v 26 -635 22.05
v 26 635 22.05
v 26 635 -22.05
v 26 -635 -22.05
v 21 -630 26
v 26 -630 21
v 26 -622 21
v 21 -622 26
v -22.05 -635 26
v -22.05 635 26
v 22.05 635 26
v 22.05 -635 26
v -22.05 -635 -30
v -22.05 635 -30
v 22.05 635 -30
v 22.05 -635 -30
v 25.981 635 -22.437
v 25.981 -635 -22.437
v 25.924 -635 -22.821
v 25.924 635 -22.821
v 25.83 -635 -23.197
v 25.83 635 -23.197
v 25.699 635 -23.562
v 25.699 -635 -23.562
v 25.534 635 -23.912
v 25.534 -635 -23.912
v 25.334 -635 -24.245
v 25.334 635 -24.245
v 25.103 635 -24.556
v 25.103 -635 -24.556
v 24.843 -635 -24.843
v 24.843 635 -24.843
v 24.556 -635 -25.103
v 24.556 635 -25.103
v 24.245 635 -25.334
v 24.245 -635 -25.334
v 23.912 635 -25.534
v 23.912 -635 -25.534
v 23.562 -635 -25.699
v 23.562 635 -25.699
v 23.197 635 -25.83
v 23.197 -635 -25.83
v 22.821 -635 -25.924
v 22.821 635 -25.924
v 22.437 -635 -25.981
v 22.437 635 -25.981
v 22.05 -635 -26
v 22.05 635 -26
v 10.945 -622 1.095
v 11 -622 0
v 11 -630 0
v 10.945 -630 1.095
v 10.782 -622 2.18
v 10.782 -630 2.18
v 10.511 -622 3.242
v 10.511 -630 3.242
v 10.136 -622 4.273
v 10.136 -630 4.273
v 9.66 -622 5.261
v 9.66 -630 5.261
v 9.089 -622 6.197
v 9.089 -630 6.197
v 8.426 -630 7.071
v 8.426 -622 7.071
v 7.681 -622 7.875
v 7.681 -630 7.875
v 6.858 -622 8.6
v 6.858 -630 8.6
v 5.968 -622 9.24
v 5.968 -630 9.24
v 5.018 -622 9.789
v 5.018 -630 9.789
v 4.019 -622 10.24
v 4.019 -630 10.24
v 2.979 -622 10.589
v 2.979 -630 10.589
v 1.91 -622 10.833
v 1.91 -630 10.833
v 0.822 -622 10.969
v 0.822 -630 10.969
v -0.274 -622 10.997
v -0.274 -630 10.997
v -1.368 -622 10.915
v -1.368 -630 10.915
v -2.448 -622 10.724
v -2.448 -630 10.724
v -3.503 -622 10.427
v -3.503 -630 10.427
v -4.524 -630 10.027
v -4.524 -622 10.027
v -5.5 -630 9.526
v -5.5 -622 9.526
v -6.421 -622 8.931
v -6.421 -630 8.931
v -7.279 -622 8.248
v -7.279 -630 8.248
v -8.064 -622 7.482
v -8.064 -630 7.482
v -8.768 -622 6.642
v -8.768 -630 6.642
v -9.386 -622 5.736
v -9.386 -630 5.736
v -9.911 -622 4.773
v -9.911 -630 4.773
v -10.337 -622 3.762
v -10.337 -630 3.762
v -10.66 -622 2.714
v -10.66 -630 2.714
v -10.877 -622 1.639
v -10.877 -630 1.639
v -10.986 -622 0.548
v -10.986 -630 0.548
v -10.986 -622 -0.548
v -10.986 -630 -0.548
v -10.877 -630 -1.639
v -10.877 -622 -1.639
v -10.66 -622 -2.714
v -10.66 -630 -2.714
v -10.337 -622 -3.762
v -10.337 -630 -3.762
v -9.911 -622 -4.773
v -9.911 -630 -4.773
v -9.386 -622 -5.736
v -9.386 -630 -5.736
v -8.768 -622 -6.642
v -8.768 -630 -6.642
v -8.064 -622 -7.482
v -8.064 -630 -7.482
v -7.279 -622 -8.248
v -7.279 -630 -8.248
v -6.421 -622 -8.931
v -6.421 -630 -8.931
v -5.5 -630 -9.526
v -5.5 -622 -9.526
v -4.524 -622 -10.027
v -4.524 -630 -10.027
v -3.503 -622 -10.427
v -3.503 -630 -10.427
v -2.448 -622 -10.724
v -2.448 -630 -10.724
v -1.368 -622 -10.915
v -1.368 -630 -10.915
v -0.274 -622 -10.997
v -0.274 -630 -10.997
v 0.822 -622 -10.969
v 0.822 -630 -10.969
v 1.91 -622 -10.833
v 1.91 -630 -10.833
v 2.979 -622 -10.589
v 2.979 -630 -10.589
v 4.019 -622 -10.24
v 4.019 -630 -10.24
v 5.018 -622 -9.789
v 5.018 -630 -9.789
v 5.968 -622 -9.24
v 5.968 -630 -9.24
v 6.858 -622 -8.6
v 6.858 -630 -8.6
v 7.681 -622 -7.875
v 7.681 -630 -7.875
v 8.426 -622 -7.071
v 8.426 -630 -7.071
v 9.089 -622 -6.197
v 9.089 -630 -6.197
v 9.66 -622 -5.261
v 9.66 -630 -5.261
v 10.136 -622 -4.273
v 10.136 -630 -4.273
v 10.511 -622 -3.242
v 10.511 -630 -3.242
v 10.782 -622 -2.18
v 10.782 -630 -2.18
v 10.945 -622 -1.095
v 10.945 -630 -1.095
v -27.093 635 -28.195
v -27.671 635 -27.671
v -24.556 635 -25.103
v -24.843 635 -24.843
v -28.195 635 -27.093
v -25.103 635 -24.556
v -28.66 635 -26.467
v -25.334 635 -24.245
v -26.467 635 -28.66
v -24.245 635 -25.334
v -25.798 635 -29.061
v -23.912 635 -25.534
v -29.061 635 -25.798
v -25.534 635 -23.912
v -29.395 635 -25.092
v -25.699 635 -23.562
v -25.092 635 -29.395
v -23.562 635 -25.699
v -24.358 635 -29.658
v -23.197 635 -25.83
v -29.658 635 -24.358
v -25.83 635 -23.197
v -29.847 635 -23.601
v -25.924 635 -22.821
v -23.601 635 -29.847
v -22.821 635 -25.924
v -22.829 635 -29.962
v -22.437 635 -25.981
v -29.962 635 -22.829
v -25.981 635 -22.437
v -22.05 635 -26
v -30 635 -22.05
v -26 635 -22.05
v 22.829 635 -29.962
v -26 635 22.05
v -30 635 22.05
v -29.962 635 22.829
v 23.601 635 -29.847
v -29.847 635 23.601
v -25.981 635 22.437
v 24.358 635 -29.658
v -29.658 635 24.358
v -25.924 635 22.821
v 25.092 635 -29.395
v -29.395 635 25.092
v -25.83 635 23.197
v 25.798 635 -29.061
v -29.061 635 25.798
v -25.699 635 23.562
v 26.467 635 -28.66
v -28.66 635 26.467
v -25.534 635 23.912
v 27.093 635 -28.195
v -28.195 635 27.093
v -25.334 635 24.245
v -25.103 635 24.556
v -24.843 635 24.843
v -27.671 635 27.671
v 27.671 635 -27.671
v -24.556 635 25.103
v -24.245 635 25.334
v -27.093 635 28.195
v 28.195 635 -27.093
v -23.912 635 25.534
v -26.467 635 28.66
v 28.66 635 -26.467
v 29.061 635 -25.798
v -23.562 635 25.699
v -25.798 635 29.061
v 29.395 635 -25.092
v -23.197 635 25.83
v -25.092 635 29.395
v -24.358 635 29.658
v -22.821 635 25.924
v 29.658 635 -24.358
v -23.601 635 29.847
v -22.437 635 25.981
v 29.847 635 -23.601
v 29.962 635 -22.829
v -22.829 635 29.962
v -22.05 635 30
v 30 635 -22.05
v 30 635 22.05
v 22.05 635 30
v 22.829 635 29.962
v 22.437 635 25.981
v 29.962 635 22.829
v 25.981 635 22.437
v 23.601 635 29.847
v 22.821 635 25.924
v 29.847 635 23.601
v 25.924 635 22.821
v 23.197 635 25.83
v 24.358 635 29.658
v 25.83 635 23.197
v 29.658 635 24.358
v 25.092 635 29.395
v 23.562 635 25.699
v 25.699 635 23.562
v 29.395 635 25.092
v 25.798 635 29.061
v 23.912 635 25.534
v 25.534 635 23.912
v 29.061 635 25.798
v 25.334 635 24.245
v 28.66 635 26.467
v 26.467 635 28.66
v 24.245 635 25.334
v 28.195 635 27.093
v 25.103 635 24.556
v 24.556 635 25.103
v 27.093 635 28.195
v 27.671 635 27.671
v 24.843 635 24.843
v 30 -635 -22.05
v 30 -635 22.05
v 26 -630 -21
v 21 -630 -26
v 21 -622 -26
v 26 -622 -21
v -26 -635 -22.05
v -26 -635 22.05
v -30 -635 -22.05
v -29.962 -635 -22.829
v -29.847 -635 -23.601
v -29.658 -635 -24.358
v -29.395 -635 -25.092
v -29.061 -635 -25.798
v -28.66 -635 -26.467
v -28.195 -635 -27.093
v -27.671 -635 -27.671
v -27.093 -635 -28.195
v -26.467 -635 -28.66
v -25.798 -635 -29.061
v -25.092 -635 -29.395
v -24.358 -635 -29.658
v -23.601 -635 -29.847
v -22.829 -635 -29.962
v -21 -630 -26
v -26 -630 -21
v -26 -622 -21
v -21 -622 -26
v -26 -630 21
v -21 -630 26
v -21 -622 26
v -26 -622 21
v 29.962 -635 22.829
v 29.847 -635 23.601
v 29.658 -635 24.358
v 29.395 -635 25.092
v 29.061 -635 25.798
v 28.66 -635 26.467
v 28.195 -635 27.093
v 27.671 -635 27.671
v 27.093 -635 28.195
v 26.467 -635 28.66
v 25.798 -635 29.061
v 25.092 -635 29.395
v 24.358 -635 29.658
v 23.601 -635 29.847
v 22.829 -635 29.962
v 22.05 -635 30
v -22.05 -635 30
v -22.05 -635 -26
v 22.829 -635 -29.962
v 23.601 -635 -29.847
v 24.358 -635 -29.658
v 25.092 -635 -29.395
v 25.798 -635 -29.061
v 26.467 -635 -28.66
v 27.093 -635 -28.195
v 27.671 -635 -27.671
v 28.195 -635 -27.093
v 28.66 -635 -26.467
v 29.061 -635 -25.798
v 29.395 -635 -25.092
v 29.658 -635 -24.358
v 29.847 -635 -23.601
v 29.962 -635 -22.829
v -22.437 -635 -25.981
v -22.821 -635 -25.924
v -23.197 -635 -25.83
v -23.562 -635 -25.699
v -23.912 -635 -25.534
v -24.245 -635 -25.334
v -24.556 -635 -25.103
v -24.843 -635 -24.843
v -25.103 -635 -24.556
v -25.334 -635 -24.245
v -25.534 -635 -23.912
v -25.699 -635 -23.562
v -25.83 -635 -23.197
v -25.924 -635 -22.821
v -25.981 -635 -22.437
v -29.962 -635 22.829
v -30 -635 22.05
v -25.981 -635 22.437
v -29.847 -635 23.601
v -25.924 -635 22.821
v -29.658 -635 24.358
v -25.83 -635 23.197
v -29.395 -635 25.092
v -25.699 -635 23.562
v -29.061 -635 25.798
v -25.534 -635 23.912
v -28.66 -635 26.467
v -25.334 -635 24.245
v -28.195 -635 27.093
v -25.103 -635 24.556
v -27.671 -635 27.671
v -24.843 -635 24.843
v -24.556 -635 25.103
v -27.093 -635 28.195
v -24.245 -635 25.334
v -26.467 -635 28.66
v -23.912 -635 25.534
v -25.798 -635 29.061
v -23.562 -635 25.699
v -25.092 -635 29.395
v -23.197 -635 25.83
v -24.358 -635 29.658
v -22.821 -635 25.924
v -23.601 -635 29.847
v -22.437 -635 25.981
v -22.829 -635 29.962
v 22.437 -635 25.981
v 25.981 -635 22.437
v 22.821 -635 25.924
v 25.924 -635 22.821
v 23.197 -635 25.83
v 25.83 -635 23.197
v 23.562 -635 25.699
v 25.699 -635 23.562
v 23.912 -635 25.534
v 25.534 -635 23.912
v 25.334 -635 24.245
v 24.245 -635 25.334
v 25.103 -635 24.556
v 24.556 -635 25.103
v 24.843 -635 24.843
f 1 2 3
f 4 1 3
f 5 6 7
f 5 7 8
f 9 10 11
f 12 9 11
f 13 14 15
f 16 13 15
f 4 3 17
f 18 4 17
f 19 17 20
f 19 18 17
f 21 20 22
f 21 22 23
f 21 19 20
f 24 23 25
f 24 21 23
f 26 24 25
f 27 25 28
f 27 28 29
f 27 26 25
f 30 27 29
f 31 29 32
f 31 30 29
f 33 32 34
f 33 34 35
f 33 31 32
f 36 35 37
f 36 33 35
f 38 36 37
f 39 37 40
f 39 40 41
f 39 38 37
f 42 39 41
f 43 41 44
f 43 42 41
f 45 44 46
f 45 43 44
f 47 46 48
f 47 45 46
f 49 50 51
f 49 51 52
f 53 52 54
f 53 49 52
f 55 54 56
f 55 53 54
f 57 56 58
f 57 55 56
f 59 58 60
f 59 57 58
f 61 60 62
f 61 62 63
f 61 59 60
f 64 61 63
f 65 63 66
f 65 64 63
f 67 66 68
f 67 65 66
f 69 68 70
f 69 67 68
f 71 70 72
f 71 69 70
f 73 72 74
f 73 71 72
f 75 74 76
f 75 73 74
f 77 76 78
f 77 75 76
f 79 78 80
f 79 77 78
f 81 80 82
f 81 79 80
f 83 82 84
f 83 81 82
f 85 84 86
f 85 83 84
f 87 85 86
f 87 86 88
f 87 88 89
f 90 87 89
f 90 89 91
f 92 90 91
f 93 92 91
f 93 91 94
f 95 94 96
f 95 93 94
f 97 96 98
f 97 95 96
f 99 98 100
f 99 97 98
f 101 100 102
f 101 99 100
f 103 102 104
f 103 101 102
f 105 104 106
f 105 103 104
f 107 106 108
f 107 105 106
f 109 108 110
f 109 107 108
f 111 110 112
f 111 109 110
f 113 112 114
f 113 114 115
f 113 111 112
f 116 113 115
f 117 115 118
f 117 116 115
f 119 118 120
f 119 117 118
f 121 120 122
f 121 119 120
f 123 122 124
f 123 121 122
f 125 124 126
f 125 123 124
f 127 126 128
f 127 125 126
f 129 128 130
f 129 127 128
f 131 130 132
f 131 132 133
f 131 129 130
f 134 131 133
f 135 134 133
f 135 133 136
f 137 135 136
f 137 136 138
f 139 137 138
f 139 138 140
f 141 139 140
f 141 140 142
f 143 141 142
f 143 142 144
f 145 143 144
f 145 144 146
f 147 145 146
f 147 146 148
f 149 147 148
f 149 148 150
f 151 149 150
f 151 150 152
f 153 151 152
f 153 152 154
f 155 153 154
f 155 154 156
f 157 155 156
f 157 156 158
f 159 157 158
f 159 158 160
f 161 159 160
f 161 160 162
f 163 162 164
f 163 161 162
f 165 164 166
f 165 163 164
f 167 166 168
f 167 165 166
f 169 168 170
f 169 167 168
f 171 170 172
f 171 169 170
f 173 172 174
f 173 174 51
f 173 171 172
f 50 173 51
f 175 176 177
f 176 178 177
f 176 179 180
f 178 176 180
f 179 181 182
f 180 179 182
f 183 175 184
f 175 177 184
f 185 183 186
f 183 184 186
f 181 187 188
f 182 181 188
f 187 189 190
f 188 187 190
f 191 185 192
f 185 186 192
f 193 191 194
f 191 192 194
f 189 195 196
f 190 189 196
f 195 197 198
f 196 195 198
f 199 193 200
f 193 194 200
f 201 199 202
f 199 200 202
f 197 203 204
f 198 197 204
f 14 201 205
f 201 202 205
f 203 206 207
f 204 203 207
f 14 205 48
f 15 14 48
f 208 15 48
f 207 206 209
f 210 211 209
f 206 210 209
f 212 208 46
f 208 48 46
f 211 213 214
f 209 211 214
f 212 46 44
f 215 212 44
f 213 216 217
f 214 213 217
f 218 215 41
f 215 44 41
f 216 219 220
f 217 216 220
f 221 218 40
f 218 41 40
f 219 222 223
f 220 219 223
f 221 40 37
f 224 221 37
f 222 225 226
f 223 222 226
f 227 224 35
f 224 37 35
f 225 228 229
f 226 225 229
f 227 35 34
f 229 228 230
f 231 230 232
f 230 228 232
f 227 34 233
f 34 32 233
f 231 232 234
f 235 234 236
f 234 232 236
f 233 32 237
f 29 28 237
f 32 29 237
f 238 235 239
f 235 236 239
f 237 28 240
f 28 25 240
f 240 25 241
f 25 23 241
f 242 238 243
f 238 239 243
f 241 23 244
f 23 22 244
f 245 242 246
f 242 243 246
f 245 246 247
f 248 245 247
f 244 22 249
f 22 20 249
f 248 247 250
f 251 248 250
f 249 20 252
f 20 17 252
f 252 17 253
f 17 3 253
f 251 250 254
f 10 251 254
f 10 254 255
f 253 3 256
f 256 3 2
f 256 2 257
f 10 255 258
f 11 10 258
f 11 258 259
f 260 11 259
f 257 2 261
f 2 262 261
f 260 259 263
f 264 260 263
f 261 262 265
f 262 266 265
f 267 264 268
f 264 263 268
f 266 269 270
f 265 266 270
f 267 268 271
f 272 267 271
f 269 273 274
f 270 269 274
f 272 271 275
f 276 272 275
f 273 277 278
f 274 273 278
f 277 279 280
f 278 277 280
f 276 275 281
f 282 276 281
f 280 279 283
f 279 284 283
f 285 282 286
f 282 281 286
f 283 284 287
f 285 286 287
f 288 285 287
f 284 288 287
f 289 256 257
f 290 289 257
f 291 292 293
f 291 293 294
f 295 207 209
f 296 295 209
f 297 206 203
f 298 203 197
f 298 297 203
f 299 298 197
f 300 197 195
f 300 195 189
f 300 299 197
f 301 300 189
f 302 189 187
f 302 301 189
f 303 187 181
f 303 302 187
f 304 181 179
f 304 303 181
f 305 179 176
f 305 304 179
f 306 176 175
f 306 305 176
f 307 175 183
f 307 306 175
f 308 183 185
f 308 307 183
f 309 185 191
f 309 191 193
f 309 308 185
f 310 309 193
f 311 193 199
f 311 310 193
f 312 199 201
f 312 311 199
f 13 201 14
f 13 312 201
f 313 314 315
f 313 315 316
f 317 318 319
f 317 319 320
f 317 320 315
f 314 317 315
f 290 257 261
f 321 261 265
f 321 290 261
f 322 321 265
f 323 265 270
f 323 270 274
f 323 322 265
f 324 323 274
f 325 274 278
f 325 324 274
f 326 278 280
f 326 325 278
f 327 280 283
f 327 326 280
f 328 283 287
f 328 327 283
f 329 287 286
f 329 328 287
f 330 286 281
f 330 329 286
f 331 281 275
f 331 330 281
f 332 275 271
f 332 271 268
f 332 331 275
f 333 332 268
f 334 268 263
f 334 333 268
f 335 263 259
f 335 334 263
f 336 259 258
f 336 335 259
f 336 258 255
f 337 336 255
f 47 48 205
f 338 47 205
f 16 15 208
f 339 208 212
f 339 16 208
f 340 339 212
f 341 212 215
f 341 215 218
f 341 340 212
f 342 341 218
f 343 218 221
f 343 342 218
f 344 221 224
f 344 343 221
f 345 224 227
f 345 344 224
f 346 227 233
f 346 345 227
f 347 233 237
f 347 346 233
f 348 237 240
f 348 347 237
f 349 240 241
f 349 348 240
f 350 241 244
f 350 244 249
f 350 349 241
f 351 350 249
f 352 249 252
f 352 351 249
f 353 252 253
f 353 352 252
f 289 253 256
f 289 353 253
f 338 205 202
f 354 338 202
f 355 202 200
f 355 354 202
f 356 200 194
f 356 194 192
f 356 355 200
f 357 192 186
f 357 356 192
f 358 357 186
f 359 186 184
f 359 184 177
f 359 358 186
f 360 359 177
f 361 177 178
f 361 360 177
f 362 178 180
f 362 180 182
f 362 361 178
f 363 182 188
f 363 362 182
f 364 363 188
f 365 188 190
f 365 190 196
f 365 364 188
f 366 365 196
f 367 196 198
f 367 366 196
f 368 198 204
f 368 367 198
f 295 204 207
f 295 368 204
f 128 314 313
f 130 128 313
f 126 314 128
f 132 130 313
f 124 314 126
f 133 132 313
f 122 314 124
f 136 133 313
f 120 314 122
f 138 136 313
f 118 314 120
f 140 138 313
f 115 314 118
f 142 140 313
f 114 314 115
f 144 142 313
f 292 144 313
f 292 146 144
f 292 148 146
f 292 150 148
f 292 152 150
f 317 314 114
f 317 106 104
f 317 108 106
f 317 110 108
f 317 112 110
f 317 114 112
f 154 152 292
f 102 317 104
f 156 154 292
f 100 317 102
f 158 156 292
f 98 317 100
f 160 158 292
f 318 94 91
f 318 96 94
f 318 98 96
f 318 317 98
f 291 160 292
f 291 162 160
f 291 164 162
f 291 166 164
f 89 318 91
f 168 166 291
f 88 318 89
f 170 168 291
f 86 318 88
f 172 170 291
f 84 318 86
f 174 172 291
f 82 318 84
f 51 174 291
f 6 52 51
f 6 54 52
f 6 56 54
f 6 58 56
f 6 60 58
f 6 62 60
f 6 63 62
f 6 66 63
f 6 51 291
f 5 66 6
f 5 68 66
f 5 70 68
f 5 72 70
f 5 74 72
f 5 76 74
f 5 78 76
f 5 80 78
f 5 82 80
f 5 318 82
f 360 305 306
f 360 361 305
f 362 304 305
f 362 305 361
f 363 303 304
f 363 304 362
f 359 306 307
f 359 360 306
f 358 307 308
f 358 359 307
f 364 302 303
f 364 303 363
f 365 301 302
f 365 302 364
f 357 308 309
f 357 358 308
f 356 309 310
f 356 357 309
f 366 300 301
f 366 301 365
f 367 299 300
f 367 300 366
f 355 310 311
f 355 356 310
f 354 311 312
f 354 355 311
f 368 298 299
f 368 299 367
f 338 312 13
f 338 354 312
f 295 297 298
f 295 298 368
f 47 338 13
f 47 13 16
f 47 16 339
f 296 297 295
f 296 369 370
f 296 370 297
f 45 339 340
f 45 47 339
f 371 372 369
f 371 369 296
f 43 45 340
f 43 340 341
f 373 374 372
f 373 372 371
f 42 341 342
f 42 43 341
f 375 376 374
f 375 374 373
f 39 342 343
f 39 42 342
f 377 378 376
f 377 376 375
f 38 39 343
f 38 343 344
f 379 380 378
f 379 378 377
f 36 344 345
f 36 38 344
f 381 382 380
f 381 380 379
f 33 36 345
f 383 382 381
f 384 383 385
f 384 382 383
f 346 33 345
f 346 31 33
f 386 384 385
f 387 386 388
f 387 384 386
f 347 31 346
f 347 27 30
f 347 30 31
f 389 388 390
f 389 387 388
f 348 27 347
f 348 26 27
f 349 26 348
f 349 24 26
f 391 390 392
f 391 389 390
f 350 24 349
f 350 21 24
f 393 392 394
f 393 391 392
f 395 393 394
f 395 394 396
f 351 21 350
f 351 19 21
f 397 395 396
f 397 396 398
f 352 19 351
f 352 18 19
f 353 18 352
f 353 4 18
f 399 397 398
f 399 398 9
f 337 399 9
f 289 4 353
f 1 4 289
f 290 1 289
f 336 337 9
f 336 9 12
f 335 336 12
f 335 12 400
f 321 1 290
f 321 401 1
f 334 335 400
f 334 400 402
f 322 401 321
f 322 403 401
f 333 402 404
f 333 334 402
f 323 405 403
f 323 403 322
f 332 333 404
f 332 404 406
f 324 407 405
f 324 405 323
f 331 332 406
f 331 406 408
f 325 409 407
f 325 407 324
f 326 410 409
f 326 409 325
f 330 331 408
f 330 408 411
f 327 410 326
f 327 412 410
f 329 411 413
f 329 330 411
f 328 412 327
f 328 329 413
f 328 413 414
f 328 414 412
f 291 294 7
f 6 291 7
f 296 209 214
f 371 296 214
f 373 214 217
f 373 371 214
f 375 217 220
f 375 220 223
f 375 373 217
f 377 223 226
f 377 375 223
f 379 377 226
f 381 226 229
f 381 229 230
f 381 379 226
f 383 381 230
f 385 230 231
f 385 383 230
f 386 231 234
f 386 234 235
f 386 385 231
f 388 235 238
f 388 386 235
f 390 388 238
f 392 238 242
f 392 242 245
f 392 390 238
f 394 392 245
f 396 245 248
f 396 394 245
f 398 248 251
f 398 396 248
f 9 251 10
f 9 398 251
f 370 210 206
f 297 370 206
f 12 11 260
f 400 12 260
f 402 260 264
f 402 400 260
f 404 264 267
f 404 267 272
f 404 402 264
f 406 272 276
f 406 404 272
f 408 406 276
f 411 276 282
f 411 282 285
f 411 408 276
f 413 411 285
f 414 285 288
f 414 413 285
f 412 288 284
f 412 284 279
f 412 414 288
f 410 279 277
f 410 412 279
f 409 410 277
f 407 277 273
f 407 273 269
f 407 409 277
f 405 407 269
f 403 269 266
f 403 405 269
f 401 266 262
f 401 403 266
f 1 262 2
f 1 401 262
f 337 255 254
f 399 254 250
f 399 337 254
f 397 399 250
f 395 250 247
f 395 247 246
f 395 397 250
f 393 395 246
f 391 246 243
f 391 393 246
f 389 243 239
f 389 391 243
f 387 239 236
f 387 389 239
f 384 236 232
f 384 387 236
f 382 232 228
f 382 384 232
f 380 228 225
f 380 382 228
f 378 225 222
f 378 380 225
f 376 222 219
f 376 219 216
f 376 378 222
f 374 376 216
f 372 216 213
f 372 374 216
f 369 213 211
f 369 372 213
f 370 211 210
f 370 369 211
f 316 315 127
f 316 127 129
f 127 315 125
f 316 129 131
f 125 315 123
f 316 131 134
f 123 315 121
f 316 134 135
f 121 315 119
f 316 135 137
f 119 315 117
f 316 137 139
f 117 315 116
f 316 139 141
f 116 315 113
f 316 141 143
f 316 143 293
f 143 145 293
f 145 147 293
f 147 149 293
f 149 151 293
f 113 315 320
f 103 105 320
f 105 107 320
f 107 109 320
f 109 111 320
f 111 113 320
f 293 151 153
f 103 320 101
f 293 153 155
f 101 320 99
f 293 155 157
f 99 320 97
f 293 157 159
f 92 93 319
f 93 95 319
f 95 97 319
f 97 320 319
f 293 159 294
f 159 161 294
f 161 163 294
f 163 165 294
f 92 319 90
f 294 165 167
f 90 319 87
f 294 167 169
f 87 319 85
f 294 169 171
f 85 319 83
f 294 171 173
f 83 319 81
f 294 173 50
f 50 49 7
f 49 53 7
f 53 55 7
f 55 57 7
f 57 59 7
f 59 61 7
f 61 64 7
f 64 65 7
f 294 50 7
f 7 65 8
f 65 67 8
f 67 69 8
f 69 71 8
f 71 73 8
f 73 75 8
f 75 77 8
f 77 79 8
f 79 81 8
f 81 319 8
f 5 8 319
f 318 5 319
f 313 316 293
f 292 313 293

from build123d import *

# Parameters (mm, degrees)
F1_DEPTH = 635
F2_START = 622
F0_R     = 11
F2_DEPTH = 8


with BuildPart() as f1:
    # F0 (on Front) → F1 (new body, symmetric)
    with BuildSketch(Plane.XZ):
        with BuildLine():
            Line((22.05, 30), (-22.05, 30))
            ThreePointArc((-22.05, 30), (-27.6714989104, 27.6714989104), (-30, 22.05))
            Line((-30, 22.05), (-30, -22.05))
            ThreePointArc((-30, -22.05), (-27.6714989104, -27.6714989104), (-22.05, -30))
            Line((-22.05, -30), (22.05, -30))
            ThreePointArc((22.05, -30), (27.6714989104, -27.6714989104), (30, -22.05))
            Line((30, -22.05), (30, 22.05))
            ThreePointArc((30, 22.05), (27.6714989104, 27.6714989104), (22.05, 30))
        make_face()
        with BuildLine():
            ThreePointArc((22.05, 26), (24.8430717857, 24.8430717857), (26, 22.05))
            Line((26, 22.05), (26, 21))
            Line((26, 21), (26, -21))
            Line((26, -21), (26, -22.05))
            ThreePointArc((26, -22.05), (24.8430717857, -24.8430717857), (22.05, -26))
            Line((22.05, -26), (21, -26))
            Line((21, -26), (-21, -26))
            Line((-21, -26), (-22.05, -26))
            ThreePointArc((-22.05, -26), (-24.8430717857, -24.8430717857), (-26, -22.05))
            Line((-26, -22.05), (-26, -21))
            Line((-26, -21), (-26, 21))
            Line((-26, 21), (-26, 22.05))
            ThreePointArc((-26, 22.05), (-24.8430717857, 24.8430717857), (-22.05, 26))
            Line((-22.05, 26), (-21, 26))
            Line((-21, 26), (21, 26))
            Line((21, 26), (22.05, 26))
        make_face(mode=Mode.SUBTRACT)
    extrude(amount=F1_DEPTH, both=True)


with BuildPart() as f2:
    # F0 (on Front) → F2 (new body)
    with BuildSketch(Plane.XZ.offset(F2_START)):
        Polygon((26, -21), (26, 21), (21, 26), (-21, 26), (-26, 21), (-26, -21), (-21, -26), (21, -26), align=None)
        Circle(F0_R, mode=Mode.SUBTRACT)
    extrude(amount=F2_DEPTH)


solid = Compound([f1.part, f2.part])
